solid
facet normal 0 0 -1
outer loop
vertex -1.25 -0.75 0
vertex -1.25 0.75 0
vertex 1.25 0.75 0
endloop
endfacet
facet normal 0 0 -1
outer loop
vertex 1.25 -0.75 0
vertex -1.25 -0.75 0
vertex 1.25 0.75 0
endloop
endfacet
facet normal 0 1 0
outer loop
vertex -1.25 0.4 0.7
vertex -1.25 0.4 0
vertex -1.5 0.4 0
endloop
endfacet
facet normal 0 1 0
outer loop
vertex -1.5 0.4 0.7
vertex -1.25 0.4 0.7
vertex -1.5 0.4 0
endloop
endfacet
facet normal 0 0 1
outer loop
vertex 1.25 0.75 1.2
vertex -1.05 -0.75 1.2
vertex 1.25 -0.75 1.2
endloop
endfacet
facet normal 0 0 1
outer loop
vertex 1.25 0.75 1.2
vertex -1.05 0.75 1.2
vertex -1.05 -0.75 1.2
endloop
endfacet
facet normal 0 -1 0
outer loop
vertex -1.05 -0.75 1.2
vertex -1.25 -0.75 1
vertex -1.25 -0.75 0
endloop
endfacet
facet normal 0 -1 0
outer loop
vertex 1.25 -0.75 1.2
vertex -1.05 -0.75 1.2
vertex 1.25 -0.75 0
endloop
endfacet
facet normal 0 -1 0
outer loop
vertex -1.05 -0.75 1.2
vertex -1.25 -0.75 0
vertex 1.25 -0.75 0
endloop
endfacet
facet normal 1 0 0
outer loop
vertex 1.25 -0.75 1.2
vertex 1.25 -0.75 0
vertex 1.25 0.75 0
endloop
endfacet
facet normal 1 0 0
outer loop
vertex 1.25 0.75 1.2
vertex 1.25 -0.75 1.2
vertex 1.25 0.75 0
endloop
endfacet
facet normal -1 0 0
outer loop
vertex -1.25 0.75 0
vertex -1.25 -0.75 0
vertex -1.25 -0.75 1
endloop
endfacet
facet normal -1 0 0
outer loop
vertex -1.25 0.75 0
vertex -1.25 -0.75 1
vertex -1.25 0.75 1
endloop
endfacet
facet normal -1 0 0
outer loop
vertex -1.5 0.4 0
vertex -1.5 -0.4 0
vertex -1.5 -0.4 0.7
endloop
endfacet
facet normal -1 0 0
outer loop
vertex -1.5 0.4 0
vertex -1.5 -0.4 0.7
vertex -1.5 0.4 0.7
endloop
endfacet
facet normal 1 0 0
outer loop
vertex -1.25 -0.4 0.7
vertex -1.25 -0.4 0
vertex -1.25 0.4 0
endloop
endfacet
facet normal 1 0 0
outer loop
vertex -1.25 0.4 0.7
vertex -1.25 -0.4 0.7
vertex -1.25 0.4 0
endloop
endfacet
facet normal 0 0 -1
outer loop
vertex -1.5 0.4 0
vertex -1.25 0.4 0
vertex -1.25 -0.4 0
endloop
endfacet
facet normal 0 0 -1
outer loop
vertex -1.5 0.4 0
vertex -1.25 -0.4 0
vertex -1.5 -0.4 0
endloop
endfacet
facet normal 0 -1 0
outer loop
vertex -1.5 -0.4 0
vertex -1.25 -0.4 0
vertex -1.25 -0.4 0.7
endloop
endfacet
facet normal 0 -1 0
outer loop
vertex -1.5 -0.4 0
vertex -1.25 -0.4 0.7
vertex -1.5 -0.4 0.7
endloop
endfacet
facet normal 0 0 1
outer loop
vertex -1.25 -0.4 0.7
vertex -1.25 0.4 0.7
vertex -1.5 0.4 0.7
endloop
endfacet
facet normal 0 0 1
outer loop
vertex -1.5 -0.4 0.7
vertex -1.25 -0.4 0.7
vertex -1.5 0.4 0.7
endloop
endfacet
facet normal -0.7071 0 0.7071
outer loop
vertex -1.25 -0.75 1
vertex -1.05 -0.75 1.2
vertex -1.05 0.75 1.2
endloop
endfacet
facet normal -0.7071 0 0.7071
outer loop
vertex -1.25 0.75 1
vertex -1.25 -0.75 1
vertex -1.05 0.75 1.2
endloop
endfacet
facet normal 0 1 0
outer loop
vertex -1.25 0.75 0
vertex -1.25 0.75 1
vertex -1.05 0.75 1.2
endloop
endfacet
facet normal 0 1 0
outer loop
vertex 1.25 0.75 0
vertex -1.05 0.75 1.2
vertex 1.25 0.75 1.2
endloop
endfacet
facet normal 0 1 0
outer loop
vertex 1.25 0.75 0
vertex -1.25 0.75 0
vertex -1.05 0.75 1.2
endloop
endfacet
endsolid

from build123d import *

# Parameters (mm, degrees)
SKETCH_W     = 2.5
SKETCH_H     = 1.5
PAD_DEPTH    = 1.2
CHAMFER_SIZE = 0.2
SKETCH001_W  = 0.25
SKETCH001_H  = 0.8
PAD001_DEPTH = 0.7


with BuildPart() as body:
    # Sketch → Pad (new body)
    with BuildSketch(Plane.XY):
        Rectangle(SKETCH_W, SKETCH_H)
    extrude(amount=PAD_DEPTH)

    # Chamfer
    chamfer_edges = [body.edges().sort_by_distance(p)[0] for p in [
        (-1.25, 0, 1.2),
    ]]
    chamfer(chamfer_edges, length=CHAMFER_SIZE)


with BuildPart() as body001:
    # Sketch001 → Pad001 (new body)
    with BuildSketch(Plane.XY):
        with Locations((1.375, 0)):
            Rectangle(SKETCH001_W, SKETCH001_H)
    extrude(amount=PAD001_DEPTH)


with BuildPart() as part_mirroring:
    # Part__Mirroring: instance of Body001
    add(body001.part.mirror(Plane(origin=(0, 0, 0), x_dir=(0, -1, 0), z_dir=(1, 0, 0))))


solid = Compound([body.part, part_mirroring.part])
